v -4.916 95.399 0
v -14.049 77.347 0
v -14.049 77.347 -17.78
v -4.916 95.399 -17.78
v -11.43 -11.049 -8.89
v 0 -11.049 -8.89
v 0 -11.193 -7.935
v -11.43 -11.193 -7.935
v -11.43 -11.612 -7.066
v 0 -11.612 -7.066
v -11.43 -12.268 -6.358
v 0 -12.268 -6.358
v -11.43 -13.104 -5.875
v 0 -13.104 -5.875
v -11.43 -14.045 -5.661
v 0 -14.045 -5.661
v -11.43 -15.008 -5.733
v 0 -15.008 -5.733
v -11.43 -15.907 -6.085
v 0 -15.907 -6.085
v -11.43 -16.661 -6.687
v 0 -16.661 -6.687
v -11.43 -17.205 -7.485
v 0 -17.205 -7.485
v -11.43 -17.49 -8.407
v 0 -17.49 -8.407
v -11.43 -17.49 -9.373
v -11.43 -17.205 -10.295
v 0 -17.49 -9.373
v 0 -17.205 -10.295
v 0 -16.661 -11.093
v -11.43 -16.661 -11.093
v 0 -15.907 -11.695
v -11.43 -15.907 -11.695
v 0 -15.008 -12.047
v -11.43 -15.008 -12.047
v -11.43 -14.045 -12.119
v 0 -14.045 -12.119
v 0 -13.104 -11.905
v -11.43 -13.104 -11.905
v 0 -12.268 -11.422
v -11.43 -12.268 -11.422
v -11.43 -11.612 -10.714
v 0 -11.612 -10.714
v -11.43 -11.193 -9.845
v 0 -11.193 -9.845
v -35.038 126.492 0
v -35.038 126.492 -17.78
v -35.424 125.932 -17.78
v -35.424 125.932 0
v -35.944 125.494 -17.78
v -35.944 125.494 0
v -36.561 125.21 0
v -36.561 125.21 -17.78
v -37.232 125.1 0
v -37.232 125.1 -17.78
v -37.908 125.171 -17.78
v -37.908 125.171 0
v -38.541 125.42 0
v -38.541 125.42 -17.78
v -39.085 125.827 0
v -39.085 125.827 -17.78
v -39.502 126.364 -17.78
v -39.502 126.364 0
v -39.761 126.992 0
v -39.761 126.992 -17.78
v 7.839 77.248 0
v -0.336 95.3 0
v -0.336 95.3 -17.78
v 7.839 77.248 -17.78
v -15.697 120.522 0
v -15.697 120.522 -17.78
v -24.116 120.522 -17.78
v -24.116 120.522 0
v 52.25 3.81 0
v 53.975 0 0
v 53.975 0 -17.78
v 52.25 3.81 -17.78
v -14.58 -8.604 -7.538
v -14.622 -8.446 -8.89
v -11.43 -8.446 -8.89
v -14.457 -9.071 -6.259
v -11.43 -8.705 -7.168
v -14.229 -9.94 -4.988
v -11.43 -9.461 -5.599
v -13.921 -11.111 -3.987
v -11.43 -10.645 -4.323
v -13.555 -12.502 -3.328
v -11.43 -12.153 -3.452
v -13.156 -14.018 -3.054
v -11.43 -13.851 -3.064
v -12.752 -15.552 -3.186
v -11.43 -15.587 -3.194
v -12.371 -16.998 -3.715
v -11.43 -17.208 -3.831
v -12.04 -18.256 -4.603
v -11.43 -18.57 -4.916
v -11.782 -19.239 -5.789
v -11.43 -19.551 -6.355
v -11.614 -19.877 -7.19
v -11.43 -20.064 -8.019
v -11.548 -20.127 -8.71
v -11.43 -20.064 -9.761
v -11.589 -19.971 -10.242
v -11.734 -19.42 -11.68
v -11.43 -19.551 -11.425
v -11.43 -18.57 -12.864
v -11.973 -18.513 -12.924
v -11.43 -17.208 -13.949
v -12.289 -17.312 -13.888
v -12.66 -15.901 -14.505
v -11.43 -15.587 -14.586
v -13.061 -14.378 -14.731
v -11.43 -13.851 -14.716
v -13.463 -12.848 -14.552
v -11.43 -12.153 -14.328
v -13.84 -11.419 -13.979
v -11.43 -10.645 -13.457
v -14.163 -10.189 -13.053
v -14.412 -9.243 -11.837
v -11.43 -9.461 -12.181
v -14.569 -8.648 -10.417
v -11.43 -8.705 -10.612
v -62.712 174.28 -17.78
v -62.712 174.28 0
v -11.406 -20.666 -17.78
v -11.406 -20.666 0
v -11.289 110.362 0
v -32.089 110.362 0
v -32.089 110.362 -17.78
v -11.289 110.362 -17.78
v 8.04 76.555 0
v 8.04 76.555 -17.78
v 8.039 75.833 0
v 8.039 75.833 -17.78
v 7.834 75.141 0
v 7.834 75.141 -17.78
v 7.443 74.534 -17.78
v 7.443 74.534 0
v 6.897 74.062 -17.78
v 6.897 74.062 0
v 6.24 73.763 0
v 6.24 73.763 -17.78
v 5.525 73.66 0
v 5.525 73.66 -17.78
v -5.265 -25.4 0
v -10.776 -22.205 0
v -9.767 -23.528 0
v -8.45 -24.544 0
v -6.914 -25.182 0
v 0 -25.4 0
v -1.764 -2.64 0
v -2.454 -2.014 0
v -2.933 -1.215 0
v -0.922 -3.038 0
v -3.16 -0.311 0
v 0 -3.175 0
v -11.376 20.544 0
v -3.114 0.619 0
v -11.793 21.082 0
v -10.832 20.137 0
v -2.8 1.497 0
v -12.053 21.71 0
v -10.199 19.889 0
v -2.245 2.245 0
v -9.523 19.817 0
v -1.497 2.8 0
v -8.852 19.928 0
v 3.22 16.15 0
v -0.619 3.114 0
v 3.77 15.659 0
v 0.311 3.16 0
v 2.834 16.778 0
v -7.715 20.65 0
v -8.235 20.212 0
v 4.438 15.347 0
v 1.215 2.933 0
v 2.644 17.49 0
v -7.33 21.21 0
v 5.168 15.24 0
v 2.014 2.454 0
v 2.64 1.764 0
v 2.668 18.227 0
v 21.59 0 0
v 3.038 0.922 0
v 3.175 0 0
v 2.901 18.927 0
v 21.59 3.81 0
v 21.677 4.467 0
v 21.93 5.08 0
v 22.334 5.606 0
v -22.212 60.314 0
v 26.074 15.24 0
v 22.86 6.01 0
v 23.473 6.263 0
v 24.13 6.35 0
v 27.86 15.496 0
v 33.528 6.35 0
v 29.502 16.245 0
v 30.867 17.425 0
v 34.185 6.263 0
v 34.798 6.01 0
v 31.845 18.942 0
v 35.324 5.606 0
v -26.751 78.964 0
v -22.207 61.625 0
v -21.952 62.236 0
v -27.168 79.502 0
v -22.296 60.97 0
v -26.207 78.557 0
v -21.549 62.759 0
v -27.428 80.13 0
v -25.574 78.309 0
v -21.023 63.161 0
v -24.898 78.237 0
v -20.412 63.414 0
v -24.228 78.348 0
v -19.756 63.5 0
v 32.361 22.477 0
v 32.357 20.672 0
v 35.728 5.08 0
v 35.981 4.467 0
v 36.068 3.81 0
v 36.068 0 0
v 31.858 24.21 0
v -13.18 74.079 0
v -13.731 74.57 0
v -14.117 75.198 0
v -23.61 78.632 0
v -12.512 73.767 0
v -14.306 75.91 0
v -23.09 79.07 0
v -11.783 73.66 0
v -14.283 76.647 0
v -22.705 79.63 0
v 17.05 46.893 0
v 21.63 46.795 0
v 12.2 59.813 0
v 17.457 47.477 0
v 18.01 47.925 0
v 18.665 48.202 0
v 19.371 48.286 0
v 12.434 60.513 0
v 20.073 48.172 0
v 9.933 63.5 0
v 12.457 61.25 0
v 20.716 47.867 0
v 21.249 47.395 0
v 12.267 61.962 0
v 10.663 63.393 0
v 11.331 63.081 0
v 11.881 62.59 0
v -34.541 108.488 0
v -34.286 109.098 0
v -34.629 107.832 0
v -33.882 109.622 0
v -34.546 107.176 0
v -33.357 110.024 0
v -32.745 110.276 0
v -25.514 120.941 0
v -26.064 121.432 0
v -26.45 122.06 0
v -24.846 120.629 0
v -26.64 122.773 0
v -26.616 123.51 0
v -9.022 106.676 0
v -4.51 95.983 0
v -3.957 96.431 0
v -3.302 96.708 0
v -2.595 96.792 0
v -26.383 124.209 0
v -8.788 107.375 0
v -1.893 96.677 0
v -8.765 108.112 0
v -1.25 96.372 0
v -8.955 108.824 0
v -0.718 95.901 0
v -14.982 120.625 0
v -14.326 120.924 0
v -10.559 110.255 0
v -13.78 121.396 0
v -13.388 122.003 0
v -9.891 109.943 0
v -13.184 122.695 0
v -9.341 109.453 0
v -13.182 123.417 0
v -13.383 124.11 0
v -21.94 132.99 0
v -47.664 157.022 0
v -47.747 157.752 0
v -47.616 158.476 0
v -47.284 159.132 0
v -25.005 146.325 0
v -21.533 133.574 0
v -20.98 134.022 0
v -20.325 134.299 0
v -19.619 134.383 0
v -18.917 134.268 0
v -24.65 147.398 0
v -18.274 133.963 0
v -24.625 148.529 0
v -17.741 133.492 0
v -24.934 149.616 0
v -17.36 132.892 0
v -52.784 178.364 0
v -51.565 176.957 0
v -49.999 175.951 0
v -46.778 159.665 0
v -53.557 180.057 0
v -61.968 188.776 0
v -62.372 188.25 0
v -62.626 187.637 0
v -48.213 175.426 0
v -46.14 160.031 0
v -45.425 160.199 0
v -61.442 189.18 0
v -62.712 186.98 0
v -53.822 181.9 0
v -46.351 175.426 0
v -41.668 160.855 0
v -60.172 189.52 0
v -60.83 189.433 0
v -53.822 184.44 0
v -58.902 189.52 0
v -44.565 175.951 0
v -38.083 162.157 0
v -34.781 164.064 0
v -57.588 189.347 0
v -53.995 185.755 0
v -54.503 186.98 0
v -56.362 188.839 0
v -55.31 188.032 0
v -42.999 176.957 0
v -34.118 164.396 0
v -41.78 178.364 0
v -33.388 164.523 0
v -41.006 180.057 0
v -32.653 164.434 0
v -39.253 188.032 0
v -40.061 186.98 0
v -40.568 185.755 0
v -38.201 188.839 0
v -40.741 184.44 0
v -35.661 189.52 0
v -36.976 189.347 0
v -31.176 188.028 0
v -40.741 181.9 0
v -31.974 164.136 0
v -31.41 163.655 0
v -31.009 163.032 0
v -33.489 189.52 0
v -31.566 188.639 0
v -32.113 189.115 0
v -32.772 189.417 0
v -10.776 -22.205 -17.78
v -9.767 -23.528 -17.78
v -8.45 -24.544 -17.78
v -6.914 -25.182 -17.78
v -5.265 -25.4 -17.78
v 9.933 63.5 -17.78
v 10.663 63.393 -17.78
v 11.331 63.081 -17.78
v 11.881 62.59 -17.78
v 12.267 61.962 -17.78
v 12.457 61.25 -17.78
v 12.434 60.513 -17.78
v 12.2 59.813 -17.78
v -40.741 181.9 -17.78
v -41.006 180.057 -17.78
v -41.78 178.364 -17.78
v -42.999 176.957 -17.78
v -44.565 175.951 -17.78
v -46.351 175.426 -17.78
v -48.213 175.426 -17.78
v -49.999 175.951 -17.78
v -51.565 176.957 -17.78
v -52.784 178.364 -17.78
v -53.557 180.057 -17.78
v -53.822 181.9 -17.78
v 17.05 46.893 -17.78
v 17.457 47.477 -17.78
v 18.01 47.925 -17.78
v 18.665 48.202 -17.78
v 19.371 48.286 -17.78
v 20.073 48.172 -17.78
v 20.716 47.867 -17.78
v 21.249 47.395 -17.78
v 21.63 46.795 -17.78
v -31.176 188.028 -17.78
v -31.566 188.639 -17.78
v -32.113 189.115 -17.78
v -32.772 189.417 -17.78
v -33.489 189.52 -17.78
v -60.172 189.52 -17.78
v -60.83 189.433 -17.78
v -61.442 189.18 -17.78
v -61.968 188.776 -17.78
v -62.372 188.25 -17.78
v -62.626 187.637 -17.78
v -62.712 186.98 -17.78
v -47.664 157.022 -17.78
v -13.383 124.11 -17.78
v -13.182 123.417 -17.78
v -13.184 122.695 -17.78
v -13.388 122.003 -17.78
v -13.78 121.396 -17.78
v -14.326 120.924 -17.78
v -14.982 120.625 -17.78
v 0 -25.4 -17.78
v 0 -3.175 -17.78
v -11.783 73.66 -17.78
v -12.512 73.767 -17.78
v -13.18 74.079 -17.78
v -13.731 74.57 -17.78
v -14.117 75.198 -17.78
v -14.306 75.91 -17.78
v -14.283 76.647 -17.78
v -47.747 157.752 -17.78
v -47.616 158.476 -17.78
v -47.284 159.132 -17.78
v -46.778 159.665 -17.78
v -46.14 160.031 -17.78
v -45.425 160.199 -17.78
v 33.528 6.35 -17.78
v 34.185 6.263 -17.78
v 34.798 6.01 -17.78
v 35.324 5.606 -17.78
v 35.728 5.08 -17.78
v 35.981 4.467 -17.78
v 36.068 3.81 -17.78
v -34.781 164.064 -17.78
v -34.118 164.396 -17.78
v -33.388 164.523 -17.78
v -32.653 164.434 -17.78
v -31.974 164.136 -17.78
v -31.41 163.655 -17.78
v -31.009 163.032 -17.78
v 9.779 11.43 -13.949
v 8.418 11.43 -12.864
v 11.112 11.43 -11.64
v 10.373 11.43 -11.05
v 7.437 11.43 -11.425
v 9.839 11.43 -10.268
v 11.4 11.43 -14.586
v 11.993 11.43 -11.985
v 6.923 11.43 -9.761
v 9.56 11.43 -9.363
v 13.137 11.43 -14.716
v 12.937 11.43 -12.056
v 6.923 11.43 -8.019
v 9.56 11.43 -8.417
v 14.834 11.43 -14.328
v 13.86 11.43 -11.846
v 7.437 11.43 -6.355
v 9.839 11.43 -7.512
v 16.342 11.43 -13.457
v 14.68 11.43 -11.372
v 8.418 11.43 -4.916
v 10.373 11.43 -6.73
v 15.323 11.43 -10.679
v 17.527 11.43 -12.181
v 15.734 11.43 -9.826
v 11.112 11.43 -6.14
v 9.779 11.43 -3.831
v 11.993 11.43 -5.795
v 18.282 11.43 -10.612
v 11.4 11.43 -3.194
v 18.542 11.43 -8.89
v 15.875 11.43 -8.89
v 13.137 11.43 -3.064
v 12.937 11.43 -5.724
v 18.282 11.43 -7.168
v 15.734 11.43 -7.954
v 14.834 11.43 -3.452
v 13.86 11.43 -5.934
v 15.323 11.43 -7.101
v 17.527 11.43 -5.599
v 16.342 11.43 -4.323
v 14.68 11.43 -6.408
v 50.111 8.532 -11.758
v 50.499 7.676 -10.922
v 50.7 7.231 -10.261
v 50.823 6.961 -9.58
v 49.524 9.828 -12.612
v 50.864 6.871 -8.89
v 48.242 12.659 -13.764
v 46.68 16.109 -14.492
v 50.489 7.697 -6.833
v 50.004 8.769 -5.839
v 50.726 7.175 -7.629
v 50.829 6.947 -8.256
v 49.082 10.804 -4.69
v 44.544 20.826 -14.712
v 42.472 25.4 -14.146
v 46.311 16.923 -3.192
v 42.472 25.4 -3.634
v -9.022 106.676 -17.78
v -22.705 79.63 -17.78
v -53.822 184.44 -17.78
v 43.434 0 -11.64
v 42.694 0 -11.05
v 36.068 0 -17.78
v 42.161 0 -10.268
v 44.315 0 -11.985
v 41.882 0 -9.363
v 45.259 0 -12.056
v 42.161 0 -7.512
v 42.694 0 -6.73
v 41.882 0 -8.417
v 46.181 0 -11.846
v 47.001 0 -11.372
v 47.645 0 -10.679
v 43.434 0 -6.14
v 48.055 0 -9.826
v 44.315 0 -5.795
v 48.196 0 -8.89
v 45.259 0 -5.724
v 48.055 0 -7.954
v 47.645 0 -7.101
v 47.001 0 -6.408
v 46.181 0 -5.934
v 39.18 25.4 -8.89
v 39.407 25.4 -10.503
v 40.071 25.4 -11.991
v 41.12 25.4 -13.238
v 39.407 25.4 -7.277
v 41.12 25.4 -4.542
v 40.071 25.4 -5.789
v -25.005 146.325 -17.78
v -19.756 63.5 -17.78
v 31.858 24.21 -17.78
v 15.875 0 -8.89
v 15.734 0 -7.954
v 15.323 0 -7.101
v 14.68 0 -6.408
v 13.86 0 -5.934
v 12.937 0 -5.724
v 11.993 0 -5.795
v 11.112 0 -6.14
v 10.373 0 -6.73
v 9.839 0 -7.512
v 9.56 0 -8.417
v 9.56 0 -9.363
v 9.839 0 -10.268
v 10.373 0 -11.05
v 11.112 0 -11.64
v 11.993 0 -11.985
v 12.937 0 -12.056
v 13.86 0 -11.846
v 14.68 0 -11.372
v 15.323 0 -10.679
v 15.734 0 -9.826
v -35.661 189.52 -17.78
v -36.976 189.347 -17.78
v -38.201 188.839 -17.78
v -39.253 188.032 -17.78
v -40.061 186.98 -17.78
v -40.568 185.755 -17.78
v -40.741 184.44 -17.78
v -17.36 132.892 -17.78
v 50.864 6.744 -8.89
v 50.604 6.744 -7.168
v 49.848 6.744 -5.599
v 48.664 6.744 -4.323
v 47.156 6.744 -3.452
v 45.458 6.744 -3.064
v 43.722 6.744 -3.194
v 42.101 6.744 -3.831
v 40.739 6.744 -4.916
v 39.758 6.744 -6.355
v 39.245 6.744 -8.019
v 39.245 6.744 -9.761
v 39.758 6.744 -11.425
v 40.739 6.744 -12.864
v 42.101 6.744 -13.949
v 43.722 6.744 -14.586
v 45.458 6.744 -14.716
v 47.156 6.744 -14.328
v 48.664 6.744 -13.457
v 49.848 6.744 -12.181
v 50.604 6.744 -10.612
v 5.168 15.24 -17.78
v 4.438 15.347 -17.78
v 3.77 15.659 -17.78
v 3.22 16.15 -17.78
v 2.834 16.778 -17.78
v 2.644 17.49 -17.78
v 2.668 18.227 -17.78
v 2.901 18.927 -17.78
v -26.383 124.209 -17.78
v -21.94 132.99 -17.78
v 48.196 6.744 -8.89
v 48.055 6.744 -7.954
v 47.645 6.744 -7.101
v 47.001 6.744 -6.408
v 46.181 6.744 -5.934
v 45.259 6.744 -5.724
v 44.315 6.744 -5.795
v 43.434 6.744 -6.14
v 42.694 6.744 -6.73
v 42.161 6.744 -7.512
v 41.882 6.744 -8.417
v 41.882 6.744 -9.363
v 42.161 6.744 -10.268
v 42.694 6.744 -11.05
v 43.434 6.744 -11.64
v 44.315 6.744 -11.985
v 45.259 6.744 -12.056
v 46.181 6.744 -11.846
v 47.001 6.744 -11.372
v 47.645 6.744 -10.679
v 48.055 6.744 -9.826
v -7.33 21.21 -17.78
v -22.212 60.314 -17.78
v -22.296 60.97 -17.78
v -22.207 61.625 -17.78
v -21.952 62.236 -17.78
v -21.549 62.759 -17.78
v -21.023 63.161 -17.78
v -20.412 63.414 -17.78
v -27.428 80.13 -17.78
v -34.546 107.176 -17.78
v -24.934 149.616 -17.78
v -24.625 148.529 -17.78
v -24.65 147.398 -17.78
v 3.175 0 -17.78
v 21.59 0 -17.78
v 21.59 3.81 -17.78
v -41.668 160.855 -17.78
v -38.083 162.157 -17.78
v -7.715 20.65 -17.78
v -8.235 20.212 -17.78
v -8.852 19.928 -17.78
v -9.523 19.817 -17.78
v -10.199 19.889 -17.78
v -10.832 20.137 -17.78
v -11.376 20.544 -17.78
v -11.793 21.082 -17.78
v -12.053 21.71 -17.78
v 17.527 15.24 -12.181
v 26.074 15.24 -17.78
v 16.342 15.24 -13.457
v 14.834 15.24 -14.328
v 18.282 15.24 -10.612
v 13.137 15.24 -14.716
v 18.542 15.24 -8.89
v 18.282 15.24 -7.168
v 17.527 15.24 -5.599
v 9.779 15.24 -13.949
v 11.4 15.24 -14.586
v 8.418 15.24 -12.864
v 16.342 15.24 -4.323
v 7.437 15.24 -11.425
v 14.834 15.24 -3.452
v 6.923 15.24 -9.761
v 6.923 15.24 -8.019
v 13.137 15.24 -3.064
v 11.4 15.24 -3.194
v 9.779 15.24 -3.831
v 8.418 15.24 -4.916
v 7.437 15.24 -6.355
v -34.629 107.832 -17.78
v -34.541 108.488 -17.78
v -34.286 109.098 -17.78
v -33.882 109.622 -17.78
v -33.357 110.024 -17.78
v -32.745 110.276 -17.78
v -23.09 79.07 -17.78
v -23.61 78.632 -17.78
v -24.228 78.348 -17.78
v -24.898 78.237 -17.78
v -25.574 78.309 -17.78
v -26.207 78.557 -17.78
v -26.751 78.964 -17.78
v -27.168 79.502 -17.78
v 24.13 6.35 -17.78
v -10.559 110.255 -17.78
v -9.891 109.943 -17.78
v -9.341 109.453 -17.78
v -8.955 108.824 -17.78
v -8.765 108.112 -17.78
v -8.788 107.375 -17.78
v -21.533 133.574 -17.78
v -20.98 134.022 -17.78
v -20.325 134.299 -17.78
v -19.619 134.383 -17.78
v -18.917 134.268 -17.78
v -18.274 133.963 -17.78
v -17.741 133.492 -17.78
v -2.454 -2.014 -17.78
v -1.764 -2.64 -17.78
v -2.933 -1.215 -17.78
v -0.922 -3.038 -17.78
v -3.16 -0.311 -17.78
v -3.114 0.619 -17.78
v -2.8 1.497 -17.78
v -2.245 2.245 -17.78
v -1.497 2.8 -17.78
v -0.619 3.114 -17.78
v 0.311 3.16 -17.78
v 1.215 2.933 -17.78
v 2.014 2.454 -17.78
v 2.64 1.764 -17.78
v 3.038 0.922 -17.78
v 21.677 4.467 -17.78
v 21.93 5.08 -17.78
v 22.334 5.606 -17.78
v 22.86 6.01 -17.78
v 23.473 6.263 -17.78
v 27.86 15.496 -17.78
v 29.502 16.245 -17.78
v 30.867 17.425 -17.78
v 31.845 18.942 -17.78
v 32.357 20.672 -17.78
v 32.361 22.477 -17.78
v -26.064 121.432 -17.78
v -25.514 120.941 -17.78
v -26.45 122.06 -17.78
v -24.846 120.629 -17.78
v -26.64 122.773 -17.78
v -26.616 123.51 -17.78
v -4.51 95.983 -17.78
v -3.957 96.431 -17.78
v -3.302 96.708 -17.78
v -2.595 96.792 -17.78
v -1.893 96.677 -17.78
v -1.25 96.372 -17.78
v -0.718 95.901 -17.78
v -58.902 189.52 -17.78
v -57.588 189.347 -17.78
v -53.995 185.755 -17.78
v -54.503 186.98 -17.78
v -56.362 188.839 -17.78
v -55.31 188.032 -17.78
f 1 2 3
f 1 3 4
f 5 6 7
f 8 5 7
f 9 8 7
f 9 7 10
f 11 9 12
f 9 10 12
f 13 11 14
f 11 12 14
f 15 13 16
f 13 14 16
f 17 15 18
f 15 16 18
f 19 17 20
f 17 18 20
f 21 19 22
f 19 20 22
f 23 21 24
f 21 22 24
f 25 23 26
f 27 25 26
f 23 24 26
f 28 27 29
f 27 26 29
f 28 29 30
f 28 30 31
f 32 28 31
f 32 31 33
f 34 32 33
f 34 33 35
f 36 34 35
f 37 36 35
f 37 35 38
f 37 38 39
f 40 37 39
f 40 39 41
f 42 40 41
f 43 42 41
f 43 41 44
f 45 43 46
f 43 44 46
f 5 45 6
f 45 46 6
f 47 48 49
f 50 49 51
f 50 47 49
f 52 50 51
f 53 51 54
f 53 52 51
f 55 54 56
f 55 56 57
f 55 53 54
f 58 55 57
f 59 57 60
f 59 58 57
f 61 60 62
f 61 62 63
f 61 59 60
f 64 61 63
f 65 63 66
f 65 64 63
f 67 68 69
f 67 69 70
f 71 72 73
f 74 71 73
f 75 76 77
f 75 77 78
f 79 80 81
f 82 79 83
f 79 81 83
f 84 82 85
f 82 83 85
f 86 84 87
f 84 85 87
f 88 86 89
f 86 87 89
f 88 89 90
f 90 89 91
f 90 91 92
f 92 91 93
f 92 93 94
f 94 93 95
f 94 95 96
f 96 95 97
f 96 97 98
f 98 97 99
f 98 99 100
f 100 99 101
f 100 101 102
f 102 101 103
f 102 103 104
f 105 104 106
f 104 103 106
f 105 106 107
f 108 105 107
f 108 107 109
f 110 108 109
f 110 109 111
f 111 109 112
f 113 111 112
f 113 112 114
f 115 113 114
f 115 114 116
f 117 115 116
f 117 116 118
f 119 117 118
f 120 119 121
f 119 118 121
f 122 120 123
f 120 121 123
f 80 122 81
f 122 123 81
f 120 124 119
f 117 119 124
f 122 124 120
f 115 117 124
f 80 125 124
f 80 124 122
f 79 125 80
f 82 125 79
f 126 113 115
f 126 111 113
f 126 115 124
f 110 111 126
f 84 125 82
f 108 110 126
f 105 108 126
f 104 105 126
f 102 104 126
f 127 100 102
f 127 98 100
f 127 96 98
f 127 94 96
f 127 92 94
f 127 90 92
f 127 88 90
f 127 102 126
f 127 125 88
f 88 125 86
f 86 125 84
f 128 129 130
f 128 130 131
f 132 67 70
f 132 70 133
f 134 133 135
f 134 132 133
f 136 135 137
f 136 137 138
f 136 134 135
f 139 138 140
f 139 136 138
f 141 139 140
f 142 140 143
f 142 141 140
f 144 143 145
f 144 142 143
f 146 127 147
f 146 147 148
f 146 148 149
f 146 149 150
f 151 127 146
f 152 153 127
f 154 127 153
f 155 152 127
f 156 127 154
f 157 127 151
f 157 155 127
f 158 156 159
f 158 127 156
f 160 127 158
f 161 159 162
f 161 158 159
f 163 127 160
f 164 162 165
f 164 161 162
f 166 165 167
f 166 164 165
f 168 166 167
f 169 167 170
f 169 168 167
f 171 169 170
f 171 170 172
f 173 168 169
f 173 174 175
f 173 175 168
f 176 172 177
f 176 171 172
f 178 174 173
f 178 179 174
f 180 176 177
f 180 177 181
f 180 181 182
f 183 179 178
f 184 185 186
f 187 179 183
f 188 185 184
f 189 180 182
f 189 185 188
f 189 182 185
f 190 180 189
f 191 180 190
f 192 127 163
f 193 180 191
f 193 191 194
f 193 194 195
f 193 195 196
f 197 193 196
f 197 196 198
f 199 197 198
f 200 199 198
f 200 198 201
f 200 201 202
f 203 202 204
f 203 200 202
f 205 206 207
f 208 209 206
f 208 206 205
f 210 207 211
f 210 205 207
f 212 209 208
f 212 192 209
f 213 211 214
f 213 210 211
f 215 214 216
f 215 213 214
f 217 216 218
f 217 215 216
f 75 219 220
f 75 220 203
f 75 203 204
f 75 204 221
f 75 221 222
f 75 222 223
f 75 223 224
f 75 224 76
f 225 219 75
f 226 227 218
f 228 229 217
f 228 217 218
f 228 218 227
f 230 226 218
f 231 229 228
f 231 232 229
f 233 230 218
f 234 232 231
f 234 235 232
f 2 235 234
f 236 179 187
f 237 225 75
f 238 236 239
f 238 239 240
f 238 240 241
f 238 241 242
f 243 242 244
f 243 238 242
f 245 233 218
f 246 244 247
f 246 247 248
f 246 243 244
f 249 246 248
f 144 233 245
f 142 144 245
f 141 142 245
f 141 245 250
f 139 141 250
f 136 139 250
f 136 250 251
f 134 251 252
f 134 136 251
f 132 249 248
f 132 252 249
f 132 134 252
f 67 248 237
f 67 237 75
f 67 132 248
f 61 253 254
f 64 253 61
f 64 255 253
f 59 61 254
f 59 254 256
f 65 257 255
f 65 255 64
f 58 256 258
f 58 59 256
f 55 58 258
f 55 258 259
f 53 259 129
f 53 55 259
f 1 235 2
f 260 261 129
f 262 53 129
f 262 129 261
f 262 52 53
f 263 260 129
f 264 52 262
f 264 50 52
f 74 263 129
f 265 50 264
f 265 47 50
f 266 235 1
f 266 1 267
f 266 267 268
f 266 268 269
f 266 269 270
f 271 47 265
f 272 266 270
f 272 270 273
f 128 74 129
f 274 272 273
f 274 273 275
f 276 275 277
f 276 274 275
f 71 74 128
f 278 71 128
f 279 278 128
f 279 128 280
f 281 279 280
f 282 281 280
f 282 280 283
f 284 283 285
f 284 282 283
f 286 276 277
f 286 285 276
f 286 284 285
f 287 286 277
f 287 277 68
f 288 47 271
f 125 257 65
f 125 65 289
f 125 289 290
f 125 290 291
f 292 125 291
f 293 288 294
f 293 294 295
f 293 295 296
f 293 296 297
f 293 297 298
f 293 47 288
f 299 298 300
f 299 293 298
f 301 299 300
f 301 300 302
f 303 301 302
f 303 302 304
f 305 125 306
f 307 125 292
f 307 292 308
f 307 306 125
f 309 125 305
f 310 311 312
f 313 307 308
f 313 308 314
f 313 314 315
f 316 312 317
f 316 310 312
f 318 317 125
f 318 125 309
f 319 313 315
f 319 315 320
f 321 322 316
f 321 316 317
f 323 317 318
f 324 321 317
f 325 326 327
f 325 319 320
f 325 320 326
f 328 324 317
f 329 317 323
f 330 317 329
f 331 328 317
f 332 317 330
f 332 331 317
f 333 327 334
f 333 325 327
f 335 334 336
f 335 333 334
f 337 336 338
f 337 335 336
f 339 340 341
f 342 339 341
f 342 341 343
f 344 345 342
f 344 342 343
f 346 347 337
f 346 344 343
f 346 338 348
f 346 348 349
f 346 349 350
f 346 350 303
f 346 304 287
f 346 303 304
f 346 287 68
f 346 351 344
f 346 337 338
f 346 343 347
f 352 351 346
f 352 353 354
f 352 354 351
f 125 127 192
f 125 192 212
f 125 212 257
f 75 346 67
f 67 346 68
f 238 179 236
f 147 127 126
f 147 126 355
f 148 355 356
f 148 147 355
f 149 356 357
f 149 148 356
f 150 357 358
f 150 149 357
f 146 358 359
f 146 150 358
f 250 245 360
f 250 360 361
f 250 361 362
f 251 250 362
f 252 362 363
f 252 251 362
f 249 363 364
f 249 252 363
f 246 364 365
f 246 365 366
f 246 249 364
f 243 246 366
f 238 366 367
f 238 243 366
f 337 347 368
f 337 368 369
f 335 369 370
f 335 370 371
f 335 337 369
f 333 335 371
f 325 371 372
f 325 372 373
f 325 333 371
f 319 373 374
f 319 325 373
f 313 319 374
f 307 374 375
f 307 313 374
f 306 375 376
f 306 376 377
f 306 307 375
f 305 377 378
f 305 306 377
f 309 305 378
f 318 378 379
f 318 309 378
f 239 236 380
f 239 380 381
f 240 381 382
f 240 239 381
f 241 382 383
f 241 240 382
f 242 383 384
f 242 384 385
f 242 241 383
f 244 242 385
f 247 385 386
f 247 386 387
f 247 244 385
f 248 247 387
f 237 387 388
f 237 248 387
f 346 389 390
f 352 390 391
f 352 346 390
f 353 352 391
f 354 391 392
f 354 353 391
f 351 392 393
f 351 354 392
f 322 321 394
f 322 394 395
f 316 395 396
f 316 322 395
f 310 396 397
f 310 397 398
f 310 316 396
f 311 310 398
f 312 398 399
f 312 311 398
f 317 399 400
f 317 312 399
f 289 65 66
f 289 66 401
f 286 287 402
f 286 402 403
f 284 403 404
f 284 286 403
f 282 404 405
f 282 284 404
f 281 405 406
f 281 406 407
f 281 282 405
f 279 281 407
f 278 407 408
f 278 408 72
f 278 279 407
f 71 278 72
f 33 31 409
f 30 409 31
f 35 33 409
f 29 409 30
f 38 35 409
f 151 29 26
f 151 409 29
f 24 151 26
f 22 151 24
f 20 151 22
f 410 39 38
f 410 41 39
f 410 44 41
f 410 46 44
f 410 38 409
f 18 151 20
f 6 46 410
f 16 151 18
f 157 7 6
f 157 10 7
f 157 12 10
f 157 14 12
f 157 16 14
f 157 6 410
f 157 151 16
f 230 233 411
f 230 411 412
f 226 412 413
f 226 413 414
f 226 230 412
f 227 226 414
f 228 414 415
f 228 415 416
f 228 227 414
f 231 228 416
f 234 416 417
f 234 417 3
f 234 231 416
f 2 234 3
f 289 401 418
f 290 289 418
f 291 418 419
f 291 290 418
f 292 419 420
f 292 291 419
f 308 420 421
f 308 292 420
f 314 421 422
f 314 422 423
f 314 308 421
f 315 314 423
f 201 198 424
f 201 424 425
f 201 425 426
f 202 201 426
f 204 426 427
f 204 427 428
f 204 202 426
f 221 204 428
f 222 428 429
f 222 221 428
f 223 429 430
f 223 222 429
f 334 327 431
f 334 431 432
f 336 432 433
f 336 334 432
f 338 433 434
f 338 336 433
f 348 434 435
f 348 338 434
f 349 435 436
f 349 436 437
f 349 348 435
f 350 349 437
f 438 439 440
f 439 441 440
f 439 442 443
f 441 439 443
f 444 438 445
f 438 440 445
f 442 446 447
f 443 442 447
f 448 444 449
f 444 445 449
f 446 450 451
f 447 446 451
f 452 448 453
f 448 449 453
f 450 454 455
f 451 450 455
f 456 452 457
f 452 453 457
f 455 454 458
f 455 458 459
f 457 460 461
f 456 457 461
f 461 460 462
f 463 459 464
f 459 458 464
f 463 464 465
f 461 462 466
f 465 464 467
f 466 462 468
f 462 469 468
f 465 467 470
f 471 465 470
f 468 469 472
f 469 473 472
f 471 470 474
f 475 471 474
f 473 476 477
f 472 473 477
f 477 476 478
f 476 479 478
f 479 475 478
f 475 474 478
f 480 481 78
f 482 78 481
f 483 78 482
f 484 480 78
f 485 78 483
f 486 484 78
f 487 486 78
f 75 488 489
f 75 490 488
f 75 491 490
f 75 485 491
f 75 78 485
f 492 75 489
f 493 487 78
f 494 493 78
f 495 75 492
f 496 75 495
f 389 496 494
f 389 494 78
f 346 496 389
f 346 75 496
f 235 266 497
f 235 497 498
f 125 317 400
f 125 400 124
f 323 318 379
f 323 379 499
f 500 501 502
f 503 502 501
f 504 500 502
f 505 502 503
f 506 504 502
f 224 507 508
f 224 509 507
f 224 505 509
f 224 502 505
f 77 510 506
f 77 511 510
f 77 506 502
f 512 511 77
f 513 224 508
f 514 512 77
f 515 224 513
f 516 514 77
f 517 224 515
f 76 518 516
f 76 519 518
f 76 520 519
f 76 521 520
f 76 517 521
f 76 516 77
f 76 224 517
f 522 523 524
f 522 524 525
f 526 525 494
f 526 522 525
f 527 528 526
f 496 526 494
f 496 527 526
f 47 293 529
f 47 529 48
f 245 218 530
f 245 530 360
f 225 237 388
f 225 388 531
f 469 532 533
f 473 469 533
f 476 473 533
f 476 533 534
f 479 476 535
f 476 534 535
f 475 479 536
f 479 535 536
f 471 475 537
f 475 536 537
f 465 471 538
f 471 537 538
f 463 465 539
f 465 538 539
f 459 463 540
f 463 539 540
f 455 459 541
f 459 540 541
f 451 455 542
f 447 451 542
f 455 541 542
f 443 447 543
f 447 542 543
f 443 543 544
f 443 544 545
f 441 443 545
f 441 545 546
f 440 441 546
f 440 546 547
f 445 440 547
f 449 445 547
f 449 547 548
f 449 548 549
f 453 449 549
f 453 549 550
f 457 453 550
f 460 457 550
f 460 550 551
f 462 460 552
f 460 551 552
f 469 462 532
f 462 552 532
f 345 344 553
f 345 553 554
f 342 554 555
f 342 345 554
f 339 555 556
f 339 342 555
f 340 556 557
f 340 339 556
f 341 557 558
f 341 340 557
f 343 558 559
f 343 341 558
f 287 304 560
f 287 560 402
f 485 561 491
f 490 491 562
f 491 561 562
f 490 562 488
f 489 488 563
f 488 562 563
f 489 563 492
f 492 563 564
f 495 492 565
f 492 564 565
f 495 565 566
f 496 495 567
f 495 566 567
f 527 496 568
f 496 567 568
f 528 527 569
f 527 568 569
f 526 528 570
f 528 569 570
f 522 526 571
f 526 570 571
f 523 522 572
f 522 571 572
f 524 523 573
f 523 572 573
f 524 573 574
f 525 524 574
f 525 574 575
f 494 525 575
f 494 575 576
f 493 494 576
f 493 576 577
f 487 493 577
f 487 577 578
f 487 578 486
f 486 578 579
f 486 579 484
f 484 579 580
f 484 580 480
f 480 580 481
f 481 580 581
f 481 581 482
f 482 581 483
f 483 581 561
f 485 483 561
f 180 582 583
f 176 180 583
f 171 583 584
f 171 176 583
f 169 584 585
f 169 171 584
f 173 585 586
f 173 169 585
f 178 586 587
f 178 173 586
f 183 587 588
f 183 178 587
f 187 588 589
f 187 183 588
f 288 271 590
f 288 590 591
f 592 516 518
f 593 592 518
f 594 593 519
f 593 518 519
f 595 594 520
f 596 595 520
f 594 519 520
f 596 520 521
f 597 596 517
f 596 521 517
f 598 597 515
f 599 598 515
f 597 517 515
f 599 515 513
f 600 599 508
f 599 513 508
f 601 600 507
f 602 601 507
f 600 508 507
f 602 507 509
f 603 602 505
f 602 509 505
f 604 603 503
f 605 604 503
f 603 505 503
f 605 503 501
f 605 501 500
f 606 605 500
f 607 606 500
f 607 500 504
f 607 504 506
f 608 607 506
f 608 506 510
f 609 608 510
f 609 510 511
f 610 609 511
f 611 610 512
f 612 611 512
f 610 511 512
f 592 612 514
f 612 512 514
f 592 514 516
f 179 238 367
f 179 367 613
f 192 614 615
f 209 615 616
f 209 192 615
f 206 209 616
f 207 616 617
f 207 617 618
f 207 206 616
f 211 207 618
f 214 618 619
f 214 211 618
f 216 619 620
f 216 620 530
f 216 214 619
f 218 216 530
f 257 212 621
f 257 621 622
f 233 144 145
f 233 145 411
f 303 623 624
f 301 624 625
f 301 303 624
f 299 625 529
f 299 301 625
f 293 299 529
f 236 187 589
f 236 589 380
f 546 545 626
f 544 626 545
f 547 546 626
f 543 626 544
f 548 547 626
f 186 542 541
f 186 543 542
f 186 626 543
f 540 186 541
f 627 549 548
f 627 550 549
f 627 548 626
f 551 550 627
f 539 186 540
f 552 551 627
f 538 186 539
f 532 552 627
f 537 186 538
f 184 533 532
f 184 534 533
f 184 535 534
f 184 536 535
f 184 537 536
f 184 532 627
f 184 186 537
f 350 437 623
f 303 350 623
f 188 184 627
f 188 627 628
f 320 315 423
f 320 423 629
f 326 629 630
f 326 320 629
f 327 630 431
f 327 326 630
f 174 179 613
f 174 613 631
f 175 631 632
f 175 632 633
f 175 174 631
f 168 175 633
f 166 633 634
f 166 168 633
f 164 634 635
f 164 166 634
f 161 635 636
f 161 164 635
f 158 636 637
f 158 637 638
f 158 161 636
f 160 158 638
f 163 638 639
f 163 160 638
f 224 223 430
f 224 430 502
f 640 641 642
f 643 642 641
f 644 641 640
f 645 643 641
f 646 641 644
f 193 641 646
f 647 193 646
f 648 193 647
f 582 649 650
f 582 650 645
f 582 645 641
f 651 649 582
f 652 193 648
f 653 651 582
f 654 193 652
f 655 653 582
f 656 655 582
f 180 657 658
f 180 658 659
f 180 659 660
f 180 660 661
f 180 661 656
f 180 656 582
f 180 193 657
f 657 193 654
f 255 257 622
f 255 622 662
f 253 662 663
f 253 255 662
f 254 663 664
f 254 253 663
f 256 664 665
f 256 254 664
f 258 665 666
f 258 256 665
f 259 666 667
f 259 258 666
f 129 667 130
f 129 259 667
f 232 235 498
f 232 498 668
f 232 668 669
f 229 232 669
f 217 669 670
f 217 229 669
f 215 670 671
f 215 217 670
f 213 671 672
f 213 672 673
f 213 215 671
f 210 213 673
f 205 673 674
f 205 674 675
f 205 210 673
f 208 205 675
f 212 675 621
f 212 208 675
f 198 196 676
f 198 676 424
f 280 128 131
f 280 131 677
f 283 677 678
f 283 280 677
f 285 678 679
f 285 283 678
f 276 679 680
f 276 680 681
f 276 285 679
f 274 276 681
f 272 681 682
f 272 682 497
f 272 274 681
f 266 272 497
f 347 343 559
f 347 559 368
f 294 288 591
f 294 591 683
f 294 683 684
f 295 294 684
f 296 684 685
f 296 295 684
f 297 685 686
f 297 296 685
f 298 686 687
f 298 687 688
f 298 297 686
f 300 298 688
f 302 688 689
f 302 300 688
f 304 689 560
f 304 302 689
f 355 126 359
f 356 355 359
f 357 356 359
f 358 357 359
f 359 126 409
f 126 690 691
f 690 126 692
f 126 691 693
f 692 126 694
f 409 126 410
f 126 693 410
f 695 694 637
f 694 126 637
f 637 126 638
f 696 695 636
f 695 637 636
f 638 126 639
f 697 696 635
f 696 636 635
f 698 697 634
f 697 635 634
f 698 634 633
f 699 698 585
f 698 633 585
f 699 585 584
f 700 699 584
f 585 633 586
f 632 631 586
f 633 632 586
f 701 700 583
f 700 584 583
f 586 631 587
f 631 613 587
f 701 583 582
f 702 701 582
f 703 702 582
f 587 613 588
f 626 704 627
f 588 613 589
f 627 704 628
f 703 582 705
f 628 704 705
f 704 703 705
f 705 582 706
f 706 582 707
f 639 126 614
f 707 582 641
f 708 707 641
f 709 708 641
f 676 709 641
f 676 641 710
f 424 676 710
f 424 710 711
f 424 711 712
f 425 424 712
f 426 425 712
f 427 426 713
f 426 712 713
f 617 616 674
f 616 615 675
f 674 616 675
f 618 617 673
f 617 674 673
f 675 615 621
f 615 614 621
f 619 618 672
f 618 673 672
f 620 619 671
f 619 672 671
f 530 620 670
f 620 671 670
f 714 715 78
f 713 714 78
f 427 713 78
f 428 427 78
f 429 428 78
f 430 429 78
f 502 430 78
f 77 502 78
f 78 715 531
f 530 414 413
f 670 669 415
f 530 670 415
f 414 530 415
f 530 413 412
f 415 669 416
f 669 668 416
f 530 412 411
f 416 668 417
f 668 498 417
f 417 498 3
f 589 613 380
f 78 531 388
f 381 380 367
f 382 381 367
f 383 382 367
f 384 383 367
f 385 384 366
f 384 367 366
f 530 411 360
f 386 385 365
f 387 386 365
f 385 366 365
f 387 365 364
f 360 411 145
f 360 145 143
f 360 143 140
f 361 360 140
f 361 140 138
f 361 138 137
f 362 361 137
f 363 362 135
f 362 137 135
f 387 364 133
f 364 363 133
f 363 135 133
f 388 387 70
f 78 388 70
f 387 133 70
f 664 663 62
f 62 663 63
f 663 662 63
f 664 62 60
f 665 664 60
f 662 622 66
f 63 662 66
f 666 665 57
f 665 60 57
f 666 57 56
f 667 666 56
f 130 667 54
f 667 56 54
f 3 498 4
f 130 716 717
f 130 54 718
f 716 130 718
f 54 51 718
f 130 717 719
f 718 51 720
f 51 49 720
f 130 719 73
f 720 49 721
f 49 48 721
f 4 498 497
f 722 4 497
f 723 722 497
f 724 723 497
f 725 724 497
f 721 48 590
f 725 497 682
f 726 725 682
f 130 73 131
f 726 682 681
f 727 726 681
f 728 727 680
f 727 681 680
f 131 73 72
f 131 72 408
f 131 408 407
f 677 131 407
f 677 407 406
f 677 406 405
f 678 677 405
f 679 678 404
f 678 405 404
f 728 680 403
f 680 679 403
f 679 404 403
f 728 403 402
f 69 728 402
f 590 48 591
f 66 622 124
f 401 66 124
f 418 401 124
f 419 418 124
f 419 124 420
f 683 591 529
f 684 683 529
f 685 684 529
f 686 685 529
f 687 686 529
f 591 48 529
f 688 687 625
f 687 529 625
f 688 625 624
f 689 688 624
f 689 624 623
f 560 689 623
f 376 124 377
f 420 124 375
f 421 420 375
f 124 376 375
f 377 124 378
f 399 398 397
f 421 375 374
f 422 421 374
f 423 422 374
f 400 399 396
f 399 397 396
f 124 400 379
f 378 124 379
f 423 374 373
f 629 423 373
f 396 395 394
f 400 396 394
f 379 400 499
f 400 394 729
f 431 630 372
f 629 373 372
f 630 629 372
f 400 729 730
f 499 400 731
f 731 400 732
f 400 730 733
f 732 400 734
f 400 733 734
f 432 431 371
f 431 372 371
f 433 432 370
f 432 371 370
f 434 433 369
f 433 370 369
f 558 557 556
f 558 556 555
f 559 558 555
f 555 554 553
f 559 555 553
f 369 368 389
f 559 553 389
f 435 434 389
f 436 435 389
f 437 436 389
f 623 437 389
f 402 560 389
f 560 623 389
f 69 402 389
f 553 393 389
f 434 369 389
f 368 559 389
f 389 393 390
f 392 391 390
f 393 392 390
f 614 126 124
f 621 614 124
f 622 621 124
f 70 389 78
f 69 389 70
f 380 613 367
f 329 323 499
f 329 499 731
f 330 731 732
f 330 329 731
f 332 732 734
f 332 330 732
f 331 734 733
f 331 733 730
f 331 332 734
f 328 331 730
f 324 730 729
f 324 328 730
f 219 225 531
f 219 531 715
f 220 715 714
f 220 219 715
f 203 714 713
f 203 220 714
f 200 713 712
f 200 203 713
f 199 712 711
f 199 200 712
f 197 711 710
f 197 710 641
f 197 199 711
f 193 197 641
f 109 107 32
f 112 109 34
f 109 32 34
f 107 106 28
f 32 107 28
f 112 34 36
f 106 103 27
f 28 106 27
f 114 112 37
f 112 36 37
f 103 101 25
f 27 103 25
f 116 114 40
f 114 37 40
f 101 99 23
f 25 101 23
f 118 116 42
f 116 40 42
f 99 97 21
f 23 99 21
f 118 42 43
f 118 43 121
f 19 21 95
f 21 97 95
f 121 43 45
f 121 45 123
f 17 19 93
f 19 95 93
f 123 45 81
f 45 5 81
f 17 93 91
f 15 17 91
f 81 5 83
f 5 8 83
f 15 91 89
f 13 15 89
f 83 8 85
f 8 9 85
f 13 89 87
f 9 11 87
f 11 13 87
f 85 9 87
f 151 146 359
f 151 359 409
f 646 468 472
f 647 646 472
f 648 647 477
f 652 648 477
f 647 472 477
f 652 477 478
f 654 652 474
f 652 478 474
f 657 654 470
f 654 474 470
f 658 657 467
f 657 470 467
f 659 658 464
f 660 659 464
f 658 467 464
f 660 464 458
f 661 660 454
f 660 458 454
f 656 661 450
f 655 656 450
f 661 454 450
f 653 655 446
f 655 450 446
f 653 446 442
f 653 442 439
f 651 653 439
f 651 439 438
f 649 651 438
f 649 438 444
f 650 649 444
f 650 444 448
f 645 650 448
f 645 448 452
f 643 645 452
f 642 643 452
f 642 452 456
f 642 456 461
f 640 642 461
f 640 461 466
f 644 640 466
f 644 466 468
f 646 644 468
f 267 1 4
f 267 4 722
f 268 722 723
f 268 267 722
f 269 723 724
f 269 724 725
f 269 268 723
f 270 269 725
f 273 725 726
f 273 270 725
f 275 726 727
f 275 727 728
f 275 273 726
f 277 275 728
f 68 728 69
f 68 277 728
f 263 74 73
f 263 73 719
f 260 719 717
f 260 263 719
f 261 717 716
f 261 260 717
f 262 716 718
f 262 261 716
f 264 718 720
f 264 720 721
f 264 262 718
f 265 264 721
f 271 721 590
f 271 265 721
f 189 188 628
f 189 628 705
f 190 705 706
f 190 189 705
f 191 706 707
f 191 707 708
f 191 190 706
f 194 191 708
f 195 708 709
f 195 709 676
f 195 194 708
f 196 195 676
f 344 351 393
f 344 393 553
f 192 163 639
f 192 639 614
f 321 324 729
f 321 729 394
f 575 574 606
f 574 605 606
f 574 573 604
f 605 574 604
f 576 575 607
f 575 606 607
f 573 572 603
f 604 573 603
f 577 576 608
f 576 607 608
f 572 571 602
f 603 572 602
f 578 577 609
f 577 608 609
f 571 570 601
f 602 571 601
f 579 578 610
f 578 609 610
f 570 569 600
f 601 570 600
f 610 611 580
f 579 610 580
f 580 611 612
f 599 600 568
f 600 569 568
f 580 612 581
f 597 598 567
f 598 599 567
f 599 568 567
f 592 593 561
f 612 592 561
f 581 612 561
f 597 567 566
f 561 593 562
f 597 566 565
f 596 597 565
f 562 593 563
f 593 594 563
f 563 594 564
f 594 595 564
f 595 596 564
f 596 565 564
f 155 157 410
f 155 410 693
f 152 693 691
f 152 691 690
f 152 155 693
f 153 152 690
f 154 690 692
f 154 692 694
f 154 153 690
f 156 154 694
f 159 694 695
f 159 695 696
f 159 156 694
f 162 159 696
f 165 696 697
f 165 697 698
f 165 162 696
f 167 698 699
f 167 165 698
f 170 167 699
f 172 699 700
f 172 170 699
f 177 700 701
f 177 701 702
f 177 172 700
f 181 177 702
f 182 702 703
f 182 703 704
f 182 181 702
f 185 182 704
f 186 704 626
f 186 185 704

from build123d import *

# Parameters (mm, degrees)
F0_W     = 18.415
F0_H     = 3.81
F1_DEPTH = 17.78
F2_R     = 5.842
F2_R_2   = 3.2385
F3_DEPTH = 25.4
F4_R     = 5.842
F4_R_2   = 3.175
F5_DEPTH = 25.4
F6_DEPTH = 11.43
F7_DEPTH = 6.7437
F8_DEPTH = 11.43


with BuildPart() as f1:
    # F0 (on Top) → F1 (new body)
    with BuildSketch(Plane.XY):
        with BuildLine():
            ThreePointArc((-40.741389, 181.9), (-47.281889, 175.3595), (-53.822389, 181.9))
            Line((-53.822389, 181.9), (-53.822389, 184.44))
            ThreePointArc((-53.822389, 184.44), (-55.310286, 188.032102), (-58.902389, 189.52))
            Line((-58.902389, 189.52), (-60.172389, 189.52))
            ThreePointArc((-60.172389, 189.52), (-61.96844, 188.776051), (-62.712389, 186.98))
            Line((-62.712389, 186.98), (-62.712389, 174.28))
            Line((-62.712389, 174.28), (-11.405862, -20.666177))
            ThreePointArc((-11.405862, -20.666177), (-9.141817, -24.079176), (-5.264977, -25.4))
            Line((-5.264977, -25.4), (-2.54, -25.4))
            Line((-2.54, -25.4), (0, -25.4))
            Line((0, -25.4), (0, -3.175))
            ThreePointArc((0, -3.175), (-2.245064, 2.245064), (3.175, 0))
            Line((3.175, 0), (3.175, 3.81))
            Line((3.175, 3.81), (21.59, 3.81))
            ThreePointArc((21.59, 3.81), (22.333949, 5.606051), (24.13, 6.35))
            Line((24.13, 6.35), (33.528, 6.35))
            ThreePointArc((33.528, 6.35), (35.324051, 5.606051), (36.068, 3.81))
            Line((36.068, 3.81), (52.249596, 3.81))
            Line((52.249596, 3.81), (-31.175642, 188.02783))
            ThreePointArc((-31.175642, 188.02783), (-32.112828, 189.114606), (-33.489438, 189.52))
            Line((-33.489438, 189.52), (-35.661389, 189.52))
            ThreePointArc((-35.661389, 189.52), (-39.253491, 188.032102), (-40.741389, 184.44))
            Line((-40.741389, 184.44), (-40.741389, 181.9))
        make_face()
        with BuildLine():
            Line((12.199936, 59.813391), (-7.329708, 21.209695))
            ThreePointArc((-7.329708, 21.209695), (-9.863664, 19.830428), (-12.052532, 21.709833))
            Line((-12.052532, 21.709833), (-22.21237, 60.313529))
            ThreePointArc((-22.21237, 60.313529), (-21.767686, 62.510736), (-19.756016, 63.5))
            Line((-19.756016, 63.5), (9.933466, 63.5))
            ThreePointArc((9.933466, 63.5), (12.097258, 62.290265), (12.199936, 59.813391))
        make_face(mode=Mode.SUBTRACT)
        with BuildLine():
            Line((26.073642, 15.24), (5.167911, 15.24))
            ThreePointArc((5.167911, 15.24), (3.004119, 16.449735), (2.901441, 18.926609))
            Line((2.901441, 18.926609), (17.049915, 46.893498))
            ThreePointArc((17.049915, 46.893498), (19.37115, 48.286298), (21.630181, 46.794719))
            Line((21.630181, 46.794719), (31.858132, 24.209575))
            ThreePointArc((31.858132, 24.209575), (31.410158, 18.148474), (26.073642, 15.24))
        make_face(mode=Mode.SUBTRACT)
        with BuildLine():
            Line((-9.022239, 106.675746), (-22.704861, 79.629695))
            ThreePointArc((-22.704861, 79.629695), (-25.238817, 78.250428), (-27.427685, 80.129833))
            Line((-27.427685, 80.129833), (-34.545747, 107.175885))
            ThreePointArc((-34.545747, 107.175885), (-34.101063, 109.373091), (-32.089393, 110.362355))
            Line((-32.089393, 110.362355), (-11.288709, 110.362355))
            ThreePointArc((-11.288709, 110.362355), (-9.124918, 109.152621), (-9.022239, 106.675746))
        make_face(mode=Mode.SUBTRACT)
        with BuildLine():
            ThreePointArc((-13.383049, 124.110186), (-13.562239, 121.685745), (-15.696845, 120.522355))
            Line((-15.696845, 120.522355), (-24.116154, 120.522355))
            ThreePointArc((-24.116154, 120.522355), (-26.279946, 121.73209), (-26.382624, 124.208965))
            Line((-26.382624, 124.208965), (-21.940091, 132.990396))
            ThreePointArc((-21.940091, 132.990396), (-19.618855, 134.383196), (-17.359824, 132.891616))
            Line((-17.359824, 132.891616), (-13.383049, 124.110186))
        make_face(mode=Mode.SUBTRACT)
        with BuildLine():
            Line((-39.761062, 126.992189), (-47.664299, 157.021619))
            ThreePointArc((-47.664299, 157.021619), (-47.283962, 159.131562), (-45.424544, 160.198838))
            ThreePointArc((-45.424544, 160.198838), (-39.847134, 161.427711), (-34.780915, 164.064198))
            ThreePointArc((-34.780915, 164.064198), (-32.65263, 164.43414), (-31.009279, 163.032051))
            Line((-31.009279, 163.032051), (-24.933857, 149.616433))
            ThreePointArc((-24.933857, 149.616433), (-24.595436, 147.962539), (-25.004845, 146.324773))
            Line((-25.004845, 146.324773), (-35.038238, 126.49205))
            ThreePointArc((-35.038238, 126.49205), (-37.572194, 125.112783), (-39.761062, 126.992189))
        make_face(mode=Mode.SUBTRACT)
        with BuildLine():
            Line((5.525331, 73.66), (-11.782777, 73.66))
            ThreePointArc((-11.782777, 73.66), (-13.946569, 74.869735), (-14.049247, 77.346609))
            Line((-14.049247, 77.346609), (-4.916449, 95.399154))
            ThreePointArc((-4.916449, 95.399154), (-2.595213, 96.791954), (-0.336183, 95.300374))
            Line((-0.336183, 95.300374), (7.839127, 77.24783))
            ThreePointArc((7.839127, 77.24783), (7.659937, 74.82339), (5.525331, 73.66))
        make_face(mode=Mode.SUBTRACT)
        Polygon((53.975, 0), (52.249596, 3.81), (36.068, 3.81), (36.068, 0), align=None)
        with Locations((12.3825, 1.905)):
            Rectangle(F0_W, F0_H)
    extrude(amount=-F1_DEPTH)

    # F2 (on face) → F3 (cut)
    with BuildSketch(Plane.YZ):
        with Locations((-14.2875, -8.89)):
            Circle(F2_R)
        with Locations((-14.2875, -8.89)):
            Circle(F2_R_2, mode=Mode.SUBTRACT)
        with Locations((-14.2875, -8.89)):
            Circle(F2_R_2)
    extrude(amount=-F3_DEPTH, mode=Mode.SUBTRACT)

    # F4 (on face) → F5 (cut)
    with BuildSketch(Plane.XZ):
        with Locations((12.7, -8.89)):
            Circle(F4_R)
        with Locations((12.7, -8.89)):
            Circle(F4_R_2, mode=Mode.SUBTRACT)
        with Locations((45.0215, -8.89)):
            Circle(F4_R)
        with Locations((45.0215, -8.89)):
            Circle(F4_R_2, mode=Mode.SUBTRACT)
        with Locations((12.7, -8.89)):
            Circle(F4_R_2)
        with Locations((45.0215, -8.89)):
            Circle(F4_R_2)
    extrude(amount=-F5_DEPTH, mode=Mode.SUBTRACT)

    # F4 (on face) → F6 (join)
    with BuildSketch(Plane.XZ):
        with Locations((12.7, -8.89)):
            Circle(F4_R)
        with Locations((12.7, -8.89)):
            Circle(F4_R_2, mode=Mode.SUBTRACT)
    extrude(amount=-F6_DEPTH)

    # F4 (on face) → F7 (join)
    with BuildSketch(Plane.XZ):
        with Locations((45.0215, -8.89)):
            Circle(F4_R)
        with Locations((45.0215, -8.89)):
            Circle(F4_R_2, mode=Mode.SUBTRACT)
    extrude(amount=-F7_DEPTH)

    # F2 (on face) → F8 (join)
    with BuildSketch(Plane.YZ):
        with Locations((-14.2875, -8.89)):
            Circle(F2_R)
        with Locations((-14.2875, -8.89)):
            Circle(F2_R_2, mode=Mode.SUBTRACT)
    extrude(amount=-F8_DEPTH)


solid = f1.part
